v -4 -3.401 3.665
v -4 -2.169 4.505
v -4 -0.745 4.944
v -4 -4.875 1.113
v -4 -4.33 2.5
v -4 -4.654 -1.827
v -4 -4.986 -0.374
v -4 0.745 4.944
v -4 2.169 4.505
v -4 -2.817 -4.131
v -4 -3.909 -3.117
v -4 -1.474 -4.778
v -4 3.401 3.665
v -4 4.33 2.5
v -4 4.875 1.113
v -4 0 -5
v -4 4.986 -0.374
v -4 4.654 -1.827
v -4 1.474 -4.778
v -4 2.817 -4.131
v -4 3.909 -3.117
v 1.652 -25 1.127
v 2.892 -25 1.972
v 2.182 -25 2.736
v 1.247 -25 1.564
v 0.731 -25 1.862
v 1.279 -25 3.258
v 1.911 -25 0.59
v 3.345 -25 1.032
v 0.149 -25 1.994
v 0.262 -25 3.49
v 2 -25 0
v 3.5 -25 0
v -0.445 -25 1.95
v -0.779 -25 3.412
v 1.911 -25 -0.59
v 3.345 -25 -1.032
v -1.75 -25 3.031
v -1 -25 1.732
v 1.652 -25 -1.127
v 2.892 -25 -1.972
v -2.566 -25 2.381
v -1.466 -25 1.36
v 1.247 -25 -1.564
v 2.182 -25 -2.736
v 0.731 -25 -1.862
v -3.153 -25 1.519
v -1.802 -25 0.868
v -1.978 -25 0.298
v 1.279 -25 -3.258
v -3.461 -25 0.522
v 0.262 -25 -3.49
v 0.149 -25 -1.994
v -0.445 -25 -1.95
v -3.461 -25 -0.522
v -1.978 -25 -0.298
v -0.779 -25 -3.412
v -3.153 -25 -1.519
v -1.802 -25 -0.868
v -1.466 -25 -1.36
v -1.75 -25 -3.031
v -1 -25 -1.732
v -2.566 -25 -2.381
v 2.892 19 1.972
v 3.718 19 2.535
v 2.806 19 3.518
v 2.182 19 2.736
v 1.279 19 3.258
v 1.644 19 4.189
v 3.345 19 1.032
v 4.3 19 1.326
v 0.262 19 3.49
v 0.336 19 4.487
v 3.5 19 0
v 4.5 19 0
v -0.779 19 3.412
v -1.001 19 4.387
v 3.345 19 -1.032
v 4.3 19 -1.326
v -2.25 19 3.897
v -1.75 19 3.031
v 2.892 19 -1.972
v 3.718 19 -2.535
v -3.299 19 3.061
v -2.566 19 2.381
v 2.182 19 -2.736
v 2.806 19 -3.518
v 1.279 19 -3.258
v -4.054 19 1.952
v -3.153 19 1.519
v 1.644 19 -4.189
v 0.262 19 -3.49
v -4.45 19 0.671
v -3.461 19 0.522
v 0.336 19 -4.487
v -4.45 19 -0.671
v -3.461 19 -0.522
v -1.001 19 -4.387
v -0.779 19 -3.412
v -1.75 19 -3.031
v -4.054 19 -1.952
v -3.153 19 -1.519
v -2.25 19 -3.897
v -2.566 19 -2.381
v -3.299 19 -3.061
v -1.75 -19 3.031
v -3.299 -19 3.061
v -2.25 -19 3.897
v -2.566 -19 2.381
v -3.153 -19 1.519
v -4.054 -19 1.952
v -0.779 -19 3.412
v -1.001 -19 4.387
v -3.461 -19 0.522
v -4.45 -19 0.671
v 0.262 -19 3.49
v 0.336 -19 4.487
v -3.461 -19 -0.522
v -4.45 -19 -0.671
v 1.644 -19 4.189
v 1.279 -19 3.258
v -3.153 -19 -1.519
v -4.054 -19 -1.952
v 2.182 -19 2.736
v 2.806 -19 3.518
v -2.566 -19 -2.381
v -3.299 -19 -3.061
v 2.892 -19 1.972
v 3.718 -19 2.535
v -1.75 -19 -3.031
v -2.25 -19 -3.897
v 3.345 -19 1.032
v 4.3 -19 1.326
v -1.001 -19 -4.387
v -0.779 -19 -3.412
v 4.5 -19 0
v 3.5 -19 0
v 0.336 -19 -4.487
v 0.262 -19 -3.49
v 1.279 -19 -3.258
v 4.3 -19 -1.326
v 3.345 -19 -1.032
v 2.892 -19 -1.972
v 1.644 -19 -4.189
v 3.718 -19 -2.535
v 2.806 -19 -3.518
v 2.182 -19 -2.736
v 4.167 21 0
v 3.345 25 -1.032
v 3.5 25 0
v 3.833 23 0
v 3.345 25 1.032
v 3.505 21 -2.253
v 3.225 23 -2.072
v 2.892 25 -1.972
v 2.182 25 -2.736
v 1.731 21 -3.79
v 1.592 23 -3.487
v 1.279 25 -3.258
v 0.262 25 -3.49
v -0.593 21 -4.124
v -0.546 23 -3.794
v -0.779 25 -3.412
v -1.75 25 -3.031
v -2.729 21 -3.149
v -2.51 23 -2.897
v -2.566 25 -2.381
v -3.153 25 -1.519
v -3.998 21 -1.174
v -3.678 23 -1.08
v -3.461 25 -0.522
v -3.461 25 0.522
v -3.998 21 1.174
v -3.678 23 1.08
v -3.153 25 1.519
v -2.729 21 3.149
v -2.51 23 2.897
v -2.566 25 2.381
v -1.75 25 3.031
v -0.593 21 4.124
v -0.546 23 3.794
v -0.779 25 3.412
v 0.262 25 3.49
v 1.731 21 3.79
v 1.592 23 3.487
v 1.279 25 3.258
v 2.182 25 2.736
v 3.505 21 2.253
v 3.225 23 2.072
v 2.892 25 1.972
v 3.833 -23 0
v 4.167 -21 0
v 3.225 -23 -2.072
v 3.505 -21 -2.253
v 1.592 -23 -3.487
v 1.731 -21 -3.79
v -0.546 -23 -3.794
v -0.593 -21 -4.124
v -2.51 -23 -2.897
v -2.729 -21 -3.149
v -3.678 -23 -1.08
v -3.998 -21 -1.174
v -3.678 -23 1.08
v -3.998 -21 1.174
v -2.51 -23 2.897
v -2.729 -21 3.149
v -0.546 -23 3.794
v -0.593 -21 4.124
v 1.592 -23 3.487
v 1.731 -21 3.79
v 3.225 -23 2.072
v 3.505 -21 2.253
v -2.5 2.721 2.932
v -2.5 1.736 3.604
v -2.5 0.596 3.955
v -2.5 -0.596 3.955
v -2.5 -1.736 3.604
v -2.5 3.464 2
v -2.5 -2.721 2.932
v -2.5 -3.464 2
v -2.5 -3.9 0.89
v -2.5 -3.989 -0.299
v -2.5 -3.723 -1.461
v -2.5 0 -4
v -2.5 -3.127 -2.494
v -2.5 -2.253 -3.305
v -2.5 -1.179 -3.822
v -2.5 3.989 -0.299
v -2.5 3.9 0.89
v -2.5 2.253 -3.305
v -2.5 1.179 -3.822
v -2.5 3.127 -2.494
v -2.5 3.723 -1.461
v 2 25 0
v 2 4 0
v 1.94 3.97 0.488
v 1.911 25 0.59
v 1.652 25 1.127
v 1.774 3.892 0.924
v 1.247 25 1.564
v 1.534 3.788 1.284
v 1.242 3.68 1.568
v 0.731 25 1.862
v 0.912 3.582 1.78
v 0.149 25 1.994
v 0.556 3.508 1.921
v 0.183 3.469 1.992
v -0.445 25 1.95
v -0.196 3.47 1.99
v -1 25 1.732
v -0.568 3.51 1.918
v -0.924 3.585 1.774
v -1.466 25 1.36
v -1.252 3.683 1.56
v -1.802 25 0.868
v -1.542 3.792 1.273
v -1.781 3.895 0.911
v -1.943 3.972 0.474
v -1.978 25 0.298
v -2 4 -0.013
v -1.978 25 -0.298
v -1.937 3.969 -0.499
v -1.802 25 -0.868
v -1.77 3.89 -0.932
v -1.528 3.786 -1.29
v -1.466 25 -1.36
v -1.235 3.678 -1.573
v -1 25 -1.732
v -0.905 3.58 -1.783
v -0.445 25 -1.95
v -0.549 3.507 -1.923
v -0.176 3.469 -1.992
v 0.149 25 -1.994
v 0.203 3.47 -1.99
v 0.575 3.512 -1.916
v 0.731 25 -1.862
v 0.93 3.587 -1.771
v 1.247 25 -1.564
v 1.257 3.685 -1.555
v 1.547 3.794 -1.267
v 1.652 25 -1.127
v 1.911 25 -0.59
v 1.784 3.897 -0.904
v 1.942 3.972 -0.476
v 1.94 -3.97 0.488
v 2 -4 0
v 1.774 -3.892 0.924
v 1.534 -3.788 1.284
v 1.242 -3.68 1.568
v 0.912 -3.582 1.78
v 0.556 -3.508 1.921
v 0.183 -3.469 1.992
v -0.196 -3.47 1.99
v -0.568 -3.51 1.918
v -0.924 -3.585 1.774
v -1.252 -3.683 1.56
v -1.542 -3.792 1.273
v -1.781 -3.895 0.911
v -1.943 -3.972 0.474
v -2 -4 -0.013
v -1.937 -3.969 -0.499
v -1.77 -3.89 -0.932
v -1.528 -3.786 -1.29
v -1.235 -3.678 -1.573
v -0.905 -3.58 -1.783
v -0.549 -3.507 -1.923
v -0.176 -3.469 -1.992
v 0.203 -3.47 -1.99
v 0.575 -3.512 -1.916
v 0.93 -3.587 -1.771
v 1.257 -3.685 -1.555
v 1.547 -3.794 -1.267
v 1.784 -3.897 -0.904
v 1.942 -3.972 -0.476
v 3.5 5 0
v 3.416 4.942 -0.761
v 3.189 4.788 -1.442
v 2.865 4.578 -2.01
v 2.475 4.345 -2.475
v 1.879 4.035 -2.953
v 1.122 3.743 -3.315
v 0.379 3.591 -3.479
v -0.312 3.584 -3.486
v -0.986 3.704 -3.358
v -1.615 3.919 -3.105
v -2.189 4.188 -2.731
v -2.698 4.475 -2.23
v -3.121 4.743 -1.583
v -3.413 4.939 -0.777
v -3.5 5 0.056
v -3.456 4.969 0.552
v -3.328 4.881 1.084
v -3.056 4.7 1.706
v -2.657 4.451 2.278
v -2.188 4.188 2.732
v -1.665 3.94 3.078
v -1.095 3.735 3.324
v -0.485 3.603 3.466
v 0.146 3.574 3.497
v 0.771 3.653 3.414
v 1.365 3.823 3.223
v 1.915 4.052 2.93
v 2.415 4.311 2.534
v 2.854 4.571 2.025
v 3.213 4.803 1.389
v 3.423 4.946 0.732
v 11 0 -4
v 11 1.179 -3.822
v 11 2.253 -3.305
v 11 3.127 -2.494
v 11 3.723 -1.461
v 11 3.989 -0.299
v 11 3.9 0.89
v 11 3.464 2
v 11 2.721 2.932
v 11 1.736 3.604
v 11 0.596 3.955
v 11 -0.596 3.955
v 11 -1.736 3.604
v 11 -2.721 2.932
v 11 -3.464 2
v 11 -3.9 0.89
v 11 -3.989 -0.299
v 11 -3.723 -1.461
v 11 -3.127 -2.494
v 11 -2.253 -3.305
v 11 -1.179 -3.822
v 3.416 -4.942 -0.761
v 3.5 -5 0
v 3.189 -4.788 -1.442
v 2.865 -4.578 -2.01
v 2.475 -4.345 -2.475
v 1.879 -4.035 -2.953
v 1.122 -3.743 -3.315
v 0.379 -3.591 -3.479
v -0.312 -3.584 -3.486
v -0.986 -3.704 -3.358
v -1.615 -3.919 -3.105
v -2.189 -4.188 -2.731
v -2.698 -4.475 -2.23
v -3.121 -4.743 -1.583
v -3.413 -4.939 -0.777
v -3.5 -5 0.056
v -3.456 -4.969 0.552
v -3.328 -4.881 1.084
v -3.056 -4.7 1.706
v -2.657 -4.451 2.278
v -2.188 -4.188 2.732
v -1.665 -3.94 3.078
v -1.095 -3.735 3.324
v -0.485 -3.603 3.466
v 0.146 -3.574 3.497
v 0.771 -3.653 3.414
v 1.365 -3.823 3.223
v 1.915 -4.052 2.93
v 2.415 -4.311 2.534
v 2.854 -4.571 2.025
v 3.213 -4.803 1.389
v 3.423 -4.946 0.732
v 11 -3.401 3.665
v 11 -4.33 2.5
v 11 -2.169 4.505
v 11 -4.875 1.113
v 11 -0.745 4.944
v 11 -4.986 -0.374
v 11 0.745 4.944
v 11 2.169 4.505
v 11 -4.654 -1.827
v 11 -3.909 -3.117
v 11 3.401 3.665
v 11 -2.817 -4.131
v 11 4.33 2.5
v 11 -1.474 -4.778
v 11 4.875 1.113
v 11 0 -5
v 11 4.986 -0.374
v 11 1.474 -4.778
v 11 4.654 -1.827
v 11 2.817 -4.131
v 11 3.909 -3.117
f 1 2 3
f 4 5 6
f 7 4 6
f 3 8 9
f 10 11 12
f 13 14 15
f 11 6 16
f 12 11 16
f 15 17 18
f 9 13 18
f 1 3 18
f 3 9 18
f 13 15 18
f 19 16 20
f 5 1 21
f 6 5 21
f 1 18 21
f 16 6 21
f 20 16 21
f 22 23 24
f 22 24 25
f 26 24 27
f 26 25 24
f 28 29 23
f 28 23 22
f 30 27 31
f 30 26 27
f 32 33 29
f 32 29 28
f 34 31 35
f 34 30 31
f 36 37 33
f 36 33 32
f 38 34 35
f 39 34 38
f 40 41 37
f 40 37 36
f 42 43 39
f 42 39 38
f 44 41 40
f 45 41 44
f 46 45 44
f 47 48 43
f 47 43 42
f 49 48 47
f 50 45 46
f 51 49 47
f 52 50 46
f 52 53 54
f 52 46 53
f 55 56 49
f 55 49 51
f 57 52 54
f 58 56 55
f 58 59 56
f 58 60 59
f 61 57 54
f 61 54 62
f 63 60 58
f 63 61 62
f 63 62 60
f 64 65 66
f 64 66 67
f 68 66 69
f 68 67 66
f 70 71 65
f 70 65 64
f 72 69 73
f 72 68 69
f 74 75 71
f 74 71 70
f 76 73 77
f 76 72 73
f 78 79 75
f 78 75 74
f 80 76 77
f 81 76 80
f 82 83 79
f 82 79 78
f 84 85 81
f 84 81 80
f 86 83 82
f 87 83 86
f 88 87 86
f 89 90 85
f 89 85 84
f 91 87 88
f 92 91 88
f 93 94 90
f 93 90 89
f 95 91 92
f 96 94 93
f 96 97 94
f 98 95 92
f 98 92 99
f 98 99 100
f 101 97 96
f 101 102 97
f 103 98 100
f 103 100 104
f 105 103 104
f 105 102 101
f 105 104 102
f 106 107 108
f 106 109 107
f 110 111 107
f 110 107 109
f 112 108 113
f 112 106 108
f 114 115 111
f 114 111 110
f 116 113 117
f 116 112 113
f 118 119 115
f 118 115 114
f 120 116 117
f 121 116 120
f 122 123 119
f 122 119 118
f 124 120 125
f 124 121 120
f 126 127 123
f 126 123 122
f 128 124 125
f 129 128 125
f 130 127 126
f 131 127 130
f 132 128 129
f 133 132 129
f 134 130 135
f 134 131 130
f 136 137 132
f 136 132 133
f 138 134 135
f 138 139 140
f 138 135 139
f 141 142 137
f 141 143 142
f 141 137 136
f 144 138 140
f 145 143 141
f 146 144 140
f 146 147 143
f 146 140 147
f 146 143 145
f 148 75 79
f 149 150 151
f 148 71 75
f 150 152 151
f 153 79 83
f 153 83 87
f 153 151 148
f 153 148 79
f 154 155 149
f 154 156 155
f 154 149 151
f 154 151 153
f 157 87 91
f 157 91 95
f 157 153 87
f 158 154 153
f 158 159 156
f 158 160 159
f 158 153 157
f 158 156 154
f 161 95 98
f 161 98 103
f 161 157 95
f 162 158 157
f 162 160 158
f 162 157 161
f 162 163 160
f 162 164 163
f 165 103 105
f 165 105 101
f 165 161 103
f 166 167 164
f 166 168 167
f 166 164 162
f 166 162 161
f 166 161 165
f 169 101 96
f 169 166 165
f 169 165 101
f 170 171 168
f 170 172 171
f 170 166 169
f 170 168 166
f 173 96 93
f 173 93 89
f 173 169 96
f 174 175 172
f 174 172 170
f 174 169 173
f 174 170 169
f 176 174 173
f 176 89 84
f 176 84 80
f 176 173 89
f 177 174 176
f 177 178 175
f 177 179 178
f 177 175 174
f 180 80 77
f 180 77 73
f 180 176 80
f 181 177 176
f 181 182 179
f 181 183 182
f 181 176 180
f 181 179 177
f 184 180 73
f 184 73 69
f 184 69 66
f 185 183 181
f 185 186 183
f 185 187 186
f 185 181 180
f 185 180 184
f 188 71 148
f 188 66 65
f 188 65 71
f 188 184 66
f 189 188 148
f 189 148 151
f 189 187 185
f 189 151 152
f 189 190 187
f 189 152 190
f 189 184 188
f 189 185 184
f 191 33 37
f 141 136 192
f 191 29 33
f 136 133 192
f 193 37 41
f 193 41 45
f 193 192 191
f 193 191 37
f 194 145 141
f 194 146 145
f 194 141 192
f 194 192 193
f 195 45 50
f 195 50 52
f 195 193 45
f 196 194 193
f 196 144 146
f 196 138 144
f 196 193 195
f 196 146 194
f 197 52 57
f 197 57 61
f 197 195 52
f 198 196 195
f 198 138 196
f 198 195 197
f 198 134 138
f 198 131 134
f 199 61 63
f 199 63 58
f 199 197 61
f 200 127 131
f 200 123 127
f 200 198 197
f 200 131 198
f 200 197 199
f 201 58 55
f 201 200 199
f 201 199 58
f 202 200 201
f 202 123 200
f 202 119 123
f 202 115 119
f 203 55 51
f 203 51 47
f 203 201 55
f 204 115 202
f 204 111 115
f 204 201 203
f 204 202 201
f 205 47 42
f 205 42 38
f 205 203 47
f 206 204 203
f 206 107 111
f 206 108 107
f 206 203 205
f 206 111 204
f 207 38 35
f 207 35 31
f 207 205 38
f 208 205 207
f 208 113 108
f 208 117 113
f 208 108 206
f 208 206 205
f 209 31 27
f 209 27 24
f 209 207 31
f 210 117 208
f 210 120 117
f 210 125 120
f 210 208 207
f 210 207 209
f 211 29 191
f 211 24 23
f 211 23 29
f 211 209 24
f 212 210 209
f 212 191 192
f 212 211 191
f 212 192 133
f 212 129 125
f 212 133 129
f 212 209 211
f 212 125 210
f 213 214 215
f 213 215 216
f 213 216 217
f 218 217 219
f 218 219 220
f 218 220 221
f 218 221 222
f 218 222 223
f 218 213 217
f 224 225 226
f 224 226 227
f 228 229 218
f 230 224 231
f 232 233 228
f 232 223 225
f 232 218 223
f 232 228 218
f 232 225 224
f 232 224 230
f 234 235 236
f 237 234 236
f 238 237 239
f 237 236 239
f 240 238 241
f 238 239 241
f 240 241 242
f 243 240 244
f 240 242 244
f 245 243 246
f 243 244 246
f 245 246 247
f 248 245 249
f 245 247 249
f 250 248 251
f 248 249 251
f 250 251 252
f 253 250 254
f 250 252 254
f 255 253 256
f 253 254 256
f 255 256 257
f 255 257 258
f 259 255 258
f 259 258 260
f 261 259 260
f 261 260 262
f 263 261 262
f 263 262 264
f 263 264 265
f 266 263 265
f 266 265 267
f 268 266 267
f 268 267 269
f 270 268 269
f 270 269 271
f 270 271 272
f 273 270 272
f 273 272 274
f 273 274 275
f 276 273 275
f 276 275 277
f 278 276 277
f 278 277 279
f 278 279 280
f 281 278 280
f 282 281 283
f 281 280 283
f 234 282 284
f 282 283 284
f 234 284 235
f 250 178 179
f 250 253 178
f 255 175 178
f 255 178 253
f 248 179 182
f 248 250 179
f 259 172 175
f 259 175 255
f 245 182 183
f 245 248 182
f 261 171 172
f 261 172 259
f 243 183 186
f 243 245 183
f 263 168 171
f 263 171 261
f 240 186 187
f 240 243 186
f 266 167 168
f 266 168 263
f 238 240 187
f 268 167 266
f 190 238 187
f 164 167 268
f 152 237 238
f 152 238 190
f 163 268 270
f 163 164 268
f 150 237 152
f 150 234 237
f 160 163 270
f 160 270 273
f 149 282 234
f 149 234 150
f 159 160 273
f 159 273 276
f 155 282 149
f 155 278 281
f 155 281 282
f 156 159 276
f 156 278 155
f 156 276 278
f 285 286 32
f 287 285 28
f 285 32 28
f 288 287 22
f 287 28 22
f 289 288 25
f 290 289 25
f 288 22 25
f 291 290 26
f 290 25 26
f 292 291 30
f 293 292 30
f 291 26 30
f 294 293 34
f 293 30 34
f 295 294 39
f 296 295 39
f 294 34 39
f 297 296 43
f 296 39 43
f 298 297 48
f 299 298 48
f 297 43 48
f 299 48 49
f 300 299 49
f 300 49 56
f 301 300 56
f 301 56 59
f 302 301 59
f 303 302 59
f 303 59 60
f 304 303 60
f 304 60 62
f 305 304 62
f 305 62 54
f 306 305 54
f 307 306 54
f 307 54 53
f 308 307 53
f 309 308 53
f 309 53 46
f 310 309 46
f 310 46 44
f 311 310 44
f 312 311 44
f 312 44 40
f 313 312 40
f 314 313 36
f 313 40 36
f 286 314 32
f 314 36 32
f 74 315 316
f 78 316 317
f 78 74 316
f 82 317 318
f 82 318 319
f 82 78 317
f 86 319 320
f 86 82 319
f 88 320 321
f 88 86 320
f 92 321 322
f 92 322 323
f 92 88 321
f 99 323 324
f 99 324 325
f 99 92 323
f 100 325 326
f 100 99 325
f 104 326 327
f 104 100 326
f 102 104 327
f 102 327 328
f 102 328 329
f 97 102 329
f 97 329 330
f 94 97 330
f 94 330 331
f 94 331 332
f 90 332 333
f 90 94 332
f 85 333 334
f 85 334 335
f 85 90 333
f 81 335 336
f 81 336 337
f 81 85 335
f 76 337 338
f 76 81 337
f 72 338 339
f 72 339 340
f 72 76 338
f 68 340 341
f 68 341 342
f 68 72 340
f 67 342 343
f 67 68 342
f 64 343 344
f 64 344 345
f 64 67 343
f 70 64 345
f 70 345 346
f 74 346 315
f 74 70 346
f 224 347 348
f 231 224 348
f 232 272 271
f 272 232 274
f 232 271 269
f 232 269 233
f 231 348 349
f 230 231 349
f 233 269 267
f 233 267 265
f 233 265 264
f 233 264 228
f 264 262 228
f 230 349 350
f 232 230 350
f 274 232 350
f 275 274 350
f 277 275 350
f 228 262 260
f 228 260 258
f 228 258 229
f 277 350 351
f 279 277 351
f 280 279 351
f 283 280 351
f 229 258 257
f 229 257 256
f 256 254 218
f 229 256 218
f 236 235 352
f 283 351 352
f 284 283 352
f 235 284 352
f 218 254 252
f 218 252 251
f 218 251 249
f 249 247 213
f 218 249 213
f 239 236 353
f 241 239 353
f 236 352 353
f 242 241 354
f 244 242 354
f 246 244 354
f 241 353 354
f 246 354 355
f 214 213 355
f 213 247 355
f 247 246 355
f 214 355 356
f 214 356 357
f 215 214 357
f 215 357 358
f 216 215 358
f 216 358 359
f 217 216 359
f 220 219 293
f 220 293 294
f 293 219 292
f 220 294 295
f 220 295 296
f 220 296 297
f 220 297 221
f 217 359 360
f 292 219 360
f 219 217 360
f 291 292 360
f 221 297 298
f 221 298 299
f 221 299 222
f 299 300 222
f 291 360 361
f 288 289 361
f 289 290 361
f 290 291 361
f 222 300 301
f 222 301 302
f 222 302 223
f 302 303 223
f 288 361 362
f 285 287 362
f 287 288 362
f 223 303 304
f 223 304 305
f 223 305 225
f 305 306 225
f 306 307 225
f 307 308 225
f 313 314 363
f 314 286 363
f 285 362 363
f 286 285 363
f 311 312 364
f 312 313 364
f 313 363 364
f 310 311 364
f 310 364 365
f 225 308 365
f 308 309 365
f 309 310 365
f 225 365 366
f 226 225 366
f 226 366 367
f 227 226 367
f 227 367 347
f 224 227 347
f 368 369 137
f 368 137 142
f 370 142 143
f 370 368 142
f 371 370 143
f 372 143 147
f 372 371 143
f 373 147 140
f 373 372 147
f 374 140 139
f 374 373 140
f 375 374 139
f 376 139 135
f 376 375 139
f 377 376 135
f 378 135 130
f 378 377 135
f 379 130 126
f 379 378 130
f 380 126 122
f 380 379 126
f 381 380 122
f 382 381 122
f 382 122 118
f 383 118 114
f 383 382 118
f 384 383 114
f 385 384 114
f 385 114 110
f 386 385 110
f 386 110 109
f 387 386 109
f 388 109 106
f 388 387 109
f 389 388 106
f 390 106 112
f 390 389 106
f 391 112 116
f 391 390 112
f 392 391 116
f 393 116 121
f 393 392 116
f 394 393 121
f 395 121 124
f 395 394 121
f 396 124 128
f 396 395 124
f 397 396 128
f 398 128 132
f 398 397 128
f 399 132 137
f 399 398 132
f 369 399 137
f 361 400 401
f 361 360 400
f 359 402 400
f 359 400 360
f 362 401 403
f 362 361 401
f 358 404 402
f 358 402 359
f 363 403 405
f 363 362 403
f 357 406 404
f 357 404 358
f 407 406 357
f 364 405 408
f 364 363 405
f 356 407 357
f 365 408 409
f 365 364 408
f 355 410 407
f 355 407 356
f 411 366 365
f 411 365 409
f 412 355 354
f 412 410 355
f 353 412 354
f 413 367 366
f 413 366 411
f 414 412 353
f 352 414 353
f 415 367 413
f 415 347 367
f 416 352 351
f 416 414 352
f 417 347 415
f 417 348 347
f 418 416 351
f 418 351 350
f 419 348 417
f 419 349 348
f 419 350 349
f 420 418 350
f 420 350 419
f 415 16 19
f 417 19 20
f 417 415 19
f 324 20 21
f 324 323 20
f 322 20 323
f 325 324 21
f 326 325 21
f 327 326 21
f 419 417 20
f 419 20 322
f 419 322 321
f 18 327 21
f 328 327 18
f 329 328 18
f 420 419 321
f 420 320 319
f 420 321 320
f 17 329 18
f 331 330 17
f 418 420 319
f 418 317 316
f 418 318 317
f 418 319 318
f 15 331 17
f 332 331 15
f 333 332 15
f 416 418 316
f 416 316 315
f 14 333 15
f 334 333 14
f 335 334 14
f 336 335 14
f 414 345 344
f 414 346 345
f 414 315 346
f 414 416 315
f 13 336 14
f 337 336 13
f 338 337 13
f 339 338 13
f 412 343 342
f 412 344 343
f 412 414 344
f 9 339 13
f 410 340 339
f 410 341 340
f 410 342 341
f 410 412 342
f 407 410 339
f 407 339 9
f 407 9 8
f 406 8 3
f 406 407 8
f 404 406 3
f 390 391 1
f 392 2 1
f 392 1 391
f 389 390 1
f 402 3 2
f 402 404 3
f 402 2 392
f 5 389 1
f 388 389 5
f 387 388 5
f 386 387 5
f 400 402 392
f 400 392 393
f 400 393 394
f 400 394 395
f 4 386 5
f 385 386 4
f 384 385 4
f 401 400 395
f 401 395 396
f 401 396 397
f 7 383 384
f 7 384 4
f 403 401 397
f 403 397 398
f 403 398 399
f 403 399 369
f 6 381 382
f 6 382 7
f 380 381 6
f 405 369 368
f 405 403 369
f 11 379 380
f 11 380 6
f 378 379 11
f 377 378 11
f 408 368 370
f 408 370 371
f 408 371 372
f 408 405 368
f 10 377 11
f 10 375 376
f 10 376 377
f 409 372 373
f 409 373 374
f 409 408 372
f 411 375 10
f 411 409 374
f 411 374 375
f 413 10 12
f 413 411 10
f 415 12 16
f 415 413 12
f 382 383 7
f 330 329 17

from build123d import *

# Parameters (mm, degrees)
SKETCH3_W           = 2.5
SKETCH3_H           = 25
SKETCH3_H_2         = 6.220476857
SKETCH3_H_3         = 18.779523143
BOSS_EXTRUDE2_START = 3.5
SKETCH5_R           = 5
BOSS_EXTRUDE2_DEPTH = 7.5
SKETCH6_R           = 4
CUT_EXTRUDE1_DEPTH  = 13.5
SKETCH7_R           = 2
CUT_EXTRUDE2_DEPTH  = 50


with BuildPart() as part:
    # Sketch3 → Revolve1 (revolve)
    with BuildSketch(Plane.XY):
        Polygon((2.5, 6.220476857), (2.5, 0), (3.5, 0), (3.5, 19), (4.5, 19), (3.5, 25), (2.5, 25), align=None)
        Polygon((2.5, 0), (2.5, -25), (3.5, -25), (4.5, -19), (3.5, -19), (3.5, 0), align=None)
        with Locations((1.25, -12.5)):
            Rectangle(SKETCH3_W, SKETCH3_H)
        with Locations((1.25, 3.110238429)):
            Rectangle(SKETCH3_W, SKETCH3_H_2)
        with Locations((1.25, 15.610238429)):
            Rectangle(SKETCH3_W, SKETCH3_H_3)
    revolve(axis=Axis((0, 0, 0), (0, 1, 0)))

    # Sketch5 → Boss-Extrude2 (add, symmetric)
    with BuildSketch(Plane(origin=(0, 0, 0), x_dir=(0, 0, -1), z_dir=(1, 0, 0)).offset(BOSS_EXTRUDE2_START)):
        Circle(SKETCH5_R)
    extrude(amount=BOSS_EXTRUDE2_DEPTH, both=True)

    # Sketch6 → Cut-Extrude1 (cut)
    with BuildSketch(Plane(origin=(11, 0, 0), x_dir=(0, 0, -1), z_dir=(1, 0, 0))):
        Circle(SKETCH6_R)
    extrude(amount=-CUT_EXTRUDE1_DEPTH, mode=Mode.SUBTRACT)

    # Sketch7 → Cut-Extrude2 (cut)
    with BuildSketch(Plane.XZ.offset(25)):
        Circle(SKETCH7_R)
    extrude(amount=-CUT_EXTRUDE2_DEPTH, mode=Mode.SUBTRACT)


solid = part.part
